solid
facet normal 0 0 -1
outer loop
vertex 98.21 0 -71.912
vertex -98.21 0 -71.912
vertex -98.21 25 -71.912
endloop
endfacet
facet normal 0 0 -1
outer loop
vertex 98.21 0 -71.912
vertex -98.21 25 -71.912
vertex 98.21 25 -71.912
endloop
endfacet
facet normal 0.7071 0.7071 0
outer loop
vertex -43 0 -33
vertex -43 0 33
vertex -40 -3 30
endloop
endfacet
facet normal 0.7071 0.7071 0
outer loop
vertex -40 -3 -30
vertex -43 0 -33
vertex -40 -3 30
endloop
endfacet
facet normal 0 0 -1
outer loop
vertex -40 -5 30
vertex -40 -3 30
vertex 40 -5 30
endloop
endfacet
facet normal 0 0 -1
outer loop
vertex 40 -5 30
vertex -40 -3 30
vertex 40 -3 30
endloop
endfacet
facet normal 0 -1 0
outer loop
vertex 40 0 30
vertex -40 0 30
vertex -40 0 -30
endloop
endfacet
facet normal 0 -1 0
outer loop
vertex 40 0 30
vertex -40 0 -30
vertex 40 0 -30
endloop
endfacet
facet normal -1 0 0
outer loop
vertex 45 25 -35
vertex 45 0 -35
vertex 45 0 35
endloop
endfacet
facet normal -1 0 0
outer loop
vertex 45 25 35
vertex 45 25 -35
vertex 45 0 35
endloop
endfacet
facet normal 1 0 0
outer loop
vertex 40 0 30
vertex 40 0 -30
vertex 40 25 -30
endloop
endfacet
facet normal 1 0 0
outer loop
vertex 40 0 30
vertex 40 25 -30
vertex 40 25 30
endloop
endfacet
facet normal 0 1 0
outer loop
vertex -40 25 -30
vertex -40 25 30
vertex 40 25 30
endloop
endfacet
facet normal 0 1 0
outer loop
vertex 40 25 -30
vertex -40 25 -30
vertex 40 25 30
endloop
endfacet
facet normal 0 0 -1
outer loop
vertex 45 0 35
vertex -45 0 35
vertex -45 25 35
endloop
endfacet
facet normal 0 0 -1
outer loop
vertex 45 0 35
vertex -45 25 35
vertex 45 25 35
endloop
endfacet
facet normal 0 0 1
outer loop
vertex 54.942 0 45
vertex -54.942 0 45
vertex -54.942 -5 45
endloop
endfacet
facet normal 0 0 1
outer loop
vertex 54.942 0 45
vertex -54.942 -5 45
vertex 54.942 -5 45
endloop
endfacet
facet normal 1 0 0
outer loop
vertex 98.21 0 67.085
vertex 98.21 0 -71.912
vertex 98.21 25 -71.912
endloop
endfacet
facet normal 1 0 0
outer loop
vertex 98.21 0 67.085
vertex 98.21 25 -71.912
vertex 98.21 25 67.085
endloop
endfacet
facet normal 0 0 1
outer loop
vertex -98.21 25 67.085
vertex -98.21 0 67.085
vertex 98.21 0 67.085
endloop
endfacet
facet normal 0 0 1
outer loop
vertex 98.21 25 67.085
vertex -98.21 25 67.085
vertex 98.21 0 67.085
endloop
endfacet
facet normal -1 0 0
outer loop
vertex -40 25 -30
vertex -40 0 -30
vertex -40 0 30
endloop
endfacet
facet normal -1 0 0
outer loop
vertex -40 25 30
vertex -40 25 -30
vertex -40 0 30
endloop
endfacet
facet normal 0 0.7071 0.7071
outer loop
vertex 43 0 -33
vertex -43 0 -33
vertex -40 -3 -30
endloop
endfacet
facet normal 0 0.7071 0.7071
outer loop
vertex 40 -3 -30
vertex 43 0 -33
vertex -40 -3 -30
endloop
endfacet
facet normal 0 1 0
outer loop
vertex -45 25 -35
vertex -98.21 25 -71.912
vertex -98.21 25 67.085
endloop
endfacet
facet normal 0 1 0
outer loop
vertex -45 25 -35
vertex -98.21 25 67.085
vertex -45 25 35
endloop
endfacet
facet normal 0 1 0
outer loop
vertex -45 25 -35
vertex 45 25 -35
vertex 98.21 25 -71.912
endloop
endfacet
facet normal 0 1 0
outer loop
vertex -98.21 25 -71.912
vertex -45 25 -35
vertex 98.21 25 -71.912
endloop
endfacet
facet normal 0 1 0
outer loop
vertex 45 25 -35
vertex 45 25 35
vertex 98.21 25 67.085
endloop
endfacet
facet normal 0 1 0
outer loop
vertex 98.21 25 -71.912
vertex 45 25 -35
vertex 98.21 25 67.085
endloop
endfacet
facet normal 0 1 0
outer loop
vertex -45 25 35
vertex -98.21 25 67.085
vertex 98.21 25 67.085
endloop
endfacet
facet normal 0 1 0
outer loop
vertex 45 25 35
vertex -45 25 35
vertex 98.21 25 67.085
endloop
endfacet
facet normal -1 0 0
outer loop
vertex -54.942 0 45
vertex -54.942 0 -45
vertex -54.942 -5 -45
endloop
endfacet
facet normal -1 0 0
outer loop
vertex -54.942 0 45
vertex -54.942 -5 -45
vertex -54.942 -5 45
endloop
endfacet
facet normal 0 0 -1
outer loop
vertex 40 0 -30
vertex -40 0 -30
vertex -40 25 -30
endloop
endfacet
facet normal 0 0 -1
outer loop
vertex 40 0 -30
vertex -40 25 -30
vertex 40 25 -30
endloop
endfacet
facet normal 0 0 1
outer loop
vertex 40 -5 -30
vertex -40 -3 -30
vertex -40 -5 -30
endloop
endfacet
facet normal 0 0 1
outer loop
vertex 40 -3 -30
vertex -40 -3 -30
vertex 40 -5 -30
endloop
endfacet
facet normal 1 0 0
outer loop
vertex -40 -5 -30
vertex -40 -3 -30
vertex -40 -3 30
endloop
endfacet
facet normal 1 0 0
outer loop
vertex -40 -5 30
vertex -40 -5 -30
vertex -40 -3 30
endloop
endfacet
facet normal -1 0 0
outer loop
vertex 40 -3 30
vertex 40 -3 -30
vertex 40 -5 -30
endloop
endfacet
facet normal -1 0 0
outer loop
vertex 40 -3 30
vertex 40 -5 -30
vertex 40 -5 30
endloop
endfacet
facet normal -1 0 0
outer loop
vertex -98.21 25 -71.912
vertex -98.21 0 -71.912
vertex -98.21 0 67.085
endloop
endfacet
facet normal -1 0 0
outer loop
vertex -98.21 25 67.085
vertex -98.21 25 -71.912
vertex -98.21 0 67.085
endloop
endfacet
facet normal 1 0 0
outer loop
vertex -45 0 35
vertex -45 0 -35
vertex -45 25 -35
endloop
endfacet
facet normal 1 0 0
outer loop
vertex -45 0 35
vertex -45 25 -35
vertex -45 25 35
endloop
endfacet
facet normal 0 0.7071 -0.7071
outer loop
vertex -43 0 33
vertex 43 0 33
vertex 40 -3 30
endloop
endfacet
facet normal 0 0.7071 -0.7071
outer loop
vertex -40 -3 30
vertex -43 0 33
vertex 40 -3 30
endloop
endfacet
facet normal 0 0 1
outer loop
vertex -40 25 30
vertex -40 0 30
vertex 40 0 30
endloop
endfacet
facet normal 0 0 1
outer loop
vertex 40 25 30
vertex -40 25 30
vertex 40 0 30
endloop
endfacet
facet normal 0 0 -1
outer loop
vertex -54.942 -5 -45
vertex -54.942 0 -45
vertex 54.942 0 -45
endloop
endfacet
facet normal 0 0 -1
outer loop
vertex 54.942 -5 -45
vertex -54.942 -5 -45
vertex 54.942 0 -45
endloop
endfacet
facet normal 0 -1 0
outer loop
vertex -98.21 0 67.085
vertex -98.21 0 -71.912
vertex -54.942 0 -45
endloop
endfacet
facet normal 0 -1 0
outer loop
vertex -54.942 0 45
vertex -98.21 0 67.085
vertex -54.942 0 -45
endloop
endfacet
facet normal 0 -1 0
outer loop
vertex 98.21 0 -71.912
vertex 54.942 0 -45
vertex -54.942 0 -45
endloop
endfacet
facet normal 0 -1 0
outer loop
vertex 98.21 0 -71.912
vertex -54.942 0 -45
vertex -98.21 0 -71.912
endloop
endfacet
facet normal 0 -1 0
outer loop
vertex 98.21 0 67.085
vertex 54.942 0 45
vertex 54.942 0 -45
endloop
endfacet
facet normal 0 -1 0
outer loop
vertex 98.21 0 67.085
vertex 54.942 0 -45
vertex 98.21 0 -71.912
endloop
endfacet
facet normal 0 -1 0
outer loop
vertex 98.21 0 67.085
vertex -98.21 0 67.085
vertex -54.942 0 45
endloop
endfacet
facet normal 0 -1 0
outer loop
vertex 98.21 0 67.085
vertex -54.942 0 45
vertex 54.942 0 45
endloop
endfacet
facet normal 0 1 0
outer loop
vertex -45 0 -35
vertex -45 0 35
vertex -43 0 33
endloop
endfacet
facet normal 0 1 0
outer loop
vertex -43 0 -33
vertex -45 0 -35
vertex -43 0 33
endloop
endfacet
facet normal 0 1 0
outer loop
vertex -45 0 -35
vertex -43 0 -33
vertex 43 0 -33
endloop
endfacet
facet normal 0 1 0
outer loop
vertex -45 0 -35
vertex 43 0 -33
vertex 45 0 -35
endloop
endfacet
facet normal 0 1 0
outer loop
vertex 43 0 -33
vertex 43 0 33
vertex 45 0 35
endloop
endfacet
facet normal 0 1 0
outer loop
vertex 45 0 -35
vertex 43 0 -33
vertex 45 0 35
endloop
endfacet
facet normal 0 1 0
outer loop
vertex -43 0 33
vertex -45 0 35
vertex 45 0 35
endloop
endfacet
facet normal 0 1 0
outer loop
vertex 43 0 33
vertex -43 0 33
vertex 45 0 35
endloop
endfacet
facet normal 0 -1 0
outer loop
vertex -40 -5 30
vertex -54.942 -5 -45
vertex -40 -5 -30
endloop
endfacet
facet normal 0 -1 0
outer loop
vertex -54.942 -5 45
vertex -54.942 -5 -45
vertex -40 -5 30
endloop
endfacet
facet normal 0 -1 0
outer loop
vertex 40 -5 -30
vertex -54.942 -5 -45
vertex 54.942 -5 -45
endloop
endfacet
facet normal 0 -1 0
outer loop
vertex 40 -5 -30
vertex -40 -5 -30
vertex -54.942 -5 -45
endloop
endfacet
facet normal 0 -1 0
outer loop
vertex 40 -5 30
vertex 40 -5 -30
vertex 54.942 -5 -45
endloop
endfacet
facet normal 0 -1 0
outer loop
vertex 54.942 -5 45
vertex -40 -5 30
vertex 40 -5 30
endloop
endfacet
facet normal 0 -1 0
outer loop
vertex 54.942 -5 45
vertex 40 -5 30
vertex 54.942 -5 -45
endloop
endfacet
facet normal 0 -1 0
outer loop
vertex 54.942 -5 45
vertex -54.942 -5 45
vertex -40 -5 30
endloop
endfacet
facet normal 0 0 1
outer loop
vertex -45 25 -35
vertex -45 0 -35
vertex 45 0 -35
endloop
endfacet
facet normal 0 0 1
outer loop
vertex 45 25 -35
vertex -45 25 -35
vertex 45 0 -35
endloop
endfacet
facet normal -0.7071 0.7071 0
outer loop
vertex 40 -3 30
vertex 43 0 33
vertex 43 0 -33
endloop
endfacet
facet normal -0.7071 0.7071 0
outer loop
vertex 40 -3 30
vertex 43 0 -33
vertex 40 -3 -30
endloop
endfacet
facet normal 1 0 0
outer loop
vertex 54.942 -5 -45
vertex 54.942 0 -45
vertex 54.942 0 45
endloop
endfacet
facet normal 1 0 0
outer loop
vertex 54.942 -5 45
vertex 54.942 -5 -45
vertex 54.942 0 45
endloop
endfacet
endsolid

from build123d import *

# Parameters (mm, degrees)
F0_W         = 80
F0_H         = 60
F1_DEPTH     = 25
F2_W         = 196.4207142591
F2_H         = 138.9969103038
F2_W_2       = 90
F2_H_2       = 70
F3_DEPTH     = 25
F4_W         = 109.8849922419
F4_H         = 90
F4_W_2       = 80
F4_H_2       = 60
F5_DEPTH     = 5
F6_T1_DEPTH  = 80
F6_T3_DEPTH  = 60
F6_T9_DEPTH  = 67.7150489639
F6_T14_DEPTH = 87.7150489639
F6_T22_DEPTH = 87.7150489639
F6_T27_DEPTH = 67.7150489639
F6_T35_DEPTH = 87.7150489639
F6_T40_DEPTH = 67.7150489639
F6_T48_DEPTH = 67.7150489639
F6_T53_DEPTH = 87.7150489639


# Not quite as in the source:
# - a fillet or chamfer that OpenCascade refuses, or shapes differently, is made with other operations: its cross-section is extruded or revolved along the edge and cut away or added


with BuildPart() as f1:
    # F0 (on Front) → F1 (new body)
    with BuildSketch(Plane.XZ):
        Rectangle(F0_W, F0_H)
    extrude(amount=-F1_DEPTH)



with BuildPart() as f3:
    # F2 (on face) → F3 (new body)
    with BuildSketch(Plane.XZ):
        with Locations((0, -2.4136770517)):
            Rectangle(F2_W, F2_H)
        Rectangle(F2_W_2, F2_H_2, mode=Mode.SUBTRACT)
    extrude(amount=-F3_DEPTH)


with BuildPart() as f1_1:
    add(f1.part)

    add(f3.part)  # F5 merges F3
    # F4 (on face) → F5 (join)
    with BuildSketch(Plane.XZ):
        Rectangle(F4_W, F4_H)
        Rectangle(F4_W_2, F4_H_2, mode=Mode.SUBTRACT)
    extrude(amount=F5_DEPTH)

    # F6: chamfer of 3 on 4 edges, made by hand

    # F6_s2 → F6_t1 (cut)
    with BuildSketch(Plane.YZ.offset(-40)):
        Polygon((0, 33), (-3, 30), (0, 30), align=None)
        Polygon((0, -33), (-3, -30), (0, -30), align=None)
    extrude(amount=F6_T1_DEPTH, mode=Mode.SUBTRACT)

    # F6_s4 → F6_t3 (cut)
    with BuildSketch(Plane.XY.offset(-30)):
        Polygon((-43, 0), (-40, -3), (-40, 0), align=None)
        Polygon((43, 0), (40, -3), (40, 0), align=None)
    extrude(amount=F6_T3_DEPTH, mode=Mode.SUBTRACT)


with BuildPart() as f6_tool7:
    # F6_s8 → F6_t9 (new body)
    with BuildSketch(Plane.XY.offset(-30)):
        Polygon((43, 0), (40, -3), (40, 0), align=None)
    extrude(amount=F6_T9_DEPTH)

    split(bisect_by=Plane.XY.offset(35), keep=Keep.BOTTOM)

    split(bisect_by=Plane.XY.offset(30), keep=Keep.TOP)


with BuildPart() as f6_tool12:
    # F6_s13 → F6_t14 (new body)
    with BuildSketch(Plane.YZ.offset(47.7150489639)):
        Polygon((0, 33), (-3, 30), (0, 30), align=None)
    extrude(amount=-F6_T14_DEPTH)

    split(bisect_by=Plane.YZ.offset(45), keep=Keep.BOTTOM)

    split(bisect_by=Plane.YZ.offset(40), keep=Keep.TOP)


with BuildPart() as f6_tool7_1:
    add(f6_tool7.part)

    # F6_t17: intersect F6_tool12
    add(f6_tool12.part, mode=Mode.INTERSECT)


with BuildPart() as f1_2:
    add(f1_1.part)

    # F6_t5: cut F6_tool7
    add(f6_tool7_1.part, mode=Mode.SUBTRACT)


with BuildPart() as f6_tool20:
    # F6_s21 → F6_t22 (new body)
    with BuildSketch(Plane.YZ.offset(40)):
        Polygon((0, 33), (-3, 30), (0, 30), align=None)
    extrude(amount=-F6_T22_DEPTH)

    split(bisect_by=Plane.YZ.offset(-45), keep=Keep.TOP)

    split(bisect_by=Plane.YZ.offset(-40), keep=Keep.BOTTOM)


with BuildPart() as f6_tool25:
    # F6_s26 → F6_t27 (new body)
    with BuildSketch(Plane.XY.offset(37.7150489639)):
        Polygon((-43, 0), (-40, -3), (-40, 0), align=None)
    extrude(amount=-F6_T27_DEPTH)

    split(bisect_by=Plane.XY.offset(35), keep=Keep.BOTTOM)

    split(bisect_by=Plane.XY.offset(30), keep=Keep.TOP)


with BuildPart() as f6_tool20_1:
    add(f6_tool20.part)

    # F6_t30: intersect F6_tool25
    add(f6_tool25.part, mode=Mode.INTERSECT)


with BuildPart() as f1_3:
    add(f1_2.part)

    # F6_t18: cut F6_tool20
    add(f6_tool20_1.part, mode=Mode.SUBTRACT)


with BuildPart() as f6_tool33:
    # F6_s34 → F6_t35 (new body)
    with BuildSketch(Plane.YZ.offset(-47.7150489639)):
        Polygon((0, -33), (-3, -30), (0, -30), align=None)
    extrude(amount=F6_T35_DEPTH)

    split(bisect_by=Plane.YZ.offset(-45), keep=Keep.TOP)

    split(bisect_by=Plane.YZ.offset(-40), keep=Keep.BOTTOM)


with BuildPart() as f6_tool38:
    # F6_s39 → F6_t40 (new body)
    with BuildSketch(Plane.XY.offset(30)):
        Polygon((-43, 0), (-40, -3), (-40, 0), align=None)
    extrude(amount=-F6_T40_DEPTH)

    split(bisect_by=Plane.XY.offset(-35), keep=Keep.TOP)

    split(bisect_by=Plane.XY.offset(-30), keep=Keep.BOTTOM)


with BuildPart() as f6_tool33_1:
    add(f6_tool33.part)

    # F6_t43: intersect F6_tool38
    add(f6_tool38.part, mode=Mode.INTERSECT)


with BuildPart() as f1_4:
    add(f1_3.part)

    # F6_t31: cut F6_tool33
    add(f6_tool33_1.part, mode=Mode.SUBTRACT)


with BuildPart() as f6_tool46:
    # F6_s47 → F6_t48 (new body)
    with BuildSketch(Plane.XY.offset(-37.7150489639)):
        Polygon((43, 0), (40, -3), (40, 0), align=None)
    extrude(amount=F6_T48_DEPTH)

    split(bisect_by=Plane.XY.offset(-35), keep=Keep.TOP)

    split(bisect_by=Plane.XY.offset(-30), keep=Keep.BOTTOM)


with BuildPart() as f6_tool51:
    # F6_s52 → F6_t53 (new body)
    with BuildSketch(Plane.YZ.offset(-40)):
        Polygon((0, -33), (-3, -30), (0, -30), align=None)
    extrude(amount=F6_T53_DEPTH)

    split(bisect_by=Plane.YZ.offset(45), keep=Keep.BOTTOM)

    split(bisect_by=Plane.YZ.offset(40), keep=Keep.TOP)


with BuildPart() as f6_tool46_1:
    add(f6_tool46.part)

    # F6_t56: intersect F6_tool51
    add(f6_tool51.part, mode=Mode.INTERSECT)


with BuildPart() as f1_5:
    add(f1_4.part)

    # F6_t44: cut F6_tool46
    add(f6_tool46_1.part, mode=Mode.SUBTRACT)


solid = f1_5.part
